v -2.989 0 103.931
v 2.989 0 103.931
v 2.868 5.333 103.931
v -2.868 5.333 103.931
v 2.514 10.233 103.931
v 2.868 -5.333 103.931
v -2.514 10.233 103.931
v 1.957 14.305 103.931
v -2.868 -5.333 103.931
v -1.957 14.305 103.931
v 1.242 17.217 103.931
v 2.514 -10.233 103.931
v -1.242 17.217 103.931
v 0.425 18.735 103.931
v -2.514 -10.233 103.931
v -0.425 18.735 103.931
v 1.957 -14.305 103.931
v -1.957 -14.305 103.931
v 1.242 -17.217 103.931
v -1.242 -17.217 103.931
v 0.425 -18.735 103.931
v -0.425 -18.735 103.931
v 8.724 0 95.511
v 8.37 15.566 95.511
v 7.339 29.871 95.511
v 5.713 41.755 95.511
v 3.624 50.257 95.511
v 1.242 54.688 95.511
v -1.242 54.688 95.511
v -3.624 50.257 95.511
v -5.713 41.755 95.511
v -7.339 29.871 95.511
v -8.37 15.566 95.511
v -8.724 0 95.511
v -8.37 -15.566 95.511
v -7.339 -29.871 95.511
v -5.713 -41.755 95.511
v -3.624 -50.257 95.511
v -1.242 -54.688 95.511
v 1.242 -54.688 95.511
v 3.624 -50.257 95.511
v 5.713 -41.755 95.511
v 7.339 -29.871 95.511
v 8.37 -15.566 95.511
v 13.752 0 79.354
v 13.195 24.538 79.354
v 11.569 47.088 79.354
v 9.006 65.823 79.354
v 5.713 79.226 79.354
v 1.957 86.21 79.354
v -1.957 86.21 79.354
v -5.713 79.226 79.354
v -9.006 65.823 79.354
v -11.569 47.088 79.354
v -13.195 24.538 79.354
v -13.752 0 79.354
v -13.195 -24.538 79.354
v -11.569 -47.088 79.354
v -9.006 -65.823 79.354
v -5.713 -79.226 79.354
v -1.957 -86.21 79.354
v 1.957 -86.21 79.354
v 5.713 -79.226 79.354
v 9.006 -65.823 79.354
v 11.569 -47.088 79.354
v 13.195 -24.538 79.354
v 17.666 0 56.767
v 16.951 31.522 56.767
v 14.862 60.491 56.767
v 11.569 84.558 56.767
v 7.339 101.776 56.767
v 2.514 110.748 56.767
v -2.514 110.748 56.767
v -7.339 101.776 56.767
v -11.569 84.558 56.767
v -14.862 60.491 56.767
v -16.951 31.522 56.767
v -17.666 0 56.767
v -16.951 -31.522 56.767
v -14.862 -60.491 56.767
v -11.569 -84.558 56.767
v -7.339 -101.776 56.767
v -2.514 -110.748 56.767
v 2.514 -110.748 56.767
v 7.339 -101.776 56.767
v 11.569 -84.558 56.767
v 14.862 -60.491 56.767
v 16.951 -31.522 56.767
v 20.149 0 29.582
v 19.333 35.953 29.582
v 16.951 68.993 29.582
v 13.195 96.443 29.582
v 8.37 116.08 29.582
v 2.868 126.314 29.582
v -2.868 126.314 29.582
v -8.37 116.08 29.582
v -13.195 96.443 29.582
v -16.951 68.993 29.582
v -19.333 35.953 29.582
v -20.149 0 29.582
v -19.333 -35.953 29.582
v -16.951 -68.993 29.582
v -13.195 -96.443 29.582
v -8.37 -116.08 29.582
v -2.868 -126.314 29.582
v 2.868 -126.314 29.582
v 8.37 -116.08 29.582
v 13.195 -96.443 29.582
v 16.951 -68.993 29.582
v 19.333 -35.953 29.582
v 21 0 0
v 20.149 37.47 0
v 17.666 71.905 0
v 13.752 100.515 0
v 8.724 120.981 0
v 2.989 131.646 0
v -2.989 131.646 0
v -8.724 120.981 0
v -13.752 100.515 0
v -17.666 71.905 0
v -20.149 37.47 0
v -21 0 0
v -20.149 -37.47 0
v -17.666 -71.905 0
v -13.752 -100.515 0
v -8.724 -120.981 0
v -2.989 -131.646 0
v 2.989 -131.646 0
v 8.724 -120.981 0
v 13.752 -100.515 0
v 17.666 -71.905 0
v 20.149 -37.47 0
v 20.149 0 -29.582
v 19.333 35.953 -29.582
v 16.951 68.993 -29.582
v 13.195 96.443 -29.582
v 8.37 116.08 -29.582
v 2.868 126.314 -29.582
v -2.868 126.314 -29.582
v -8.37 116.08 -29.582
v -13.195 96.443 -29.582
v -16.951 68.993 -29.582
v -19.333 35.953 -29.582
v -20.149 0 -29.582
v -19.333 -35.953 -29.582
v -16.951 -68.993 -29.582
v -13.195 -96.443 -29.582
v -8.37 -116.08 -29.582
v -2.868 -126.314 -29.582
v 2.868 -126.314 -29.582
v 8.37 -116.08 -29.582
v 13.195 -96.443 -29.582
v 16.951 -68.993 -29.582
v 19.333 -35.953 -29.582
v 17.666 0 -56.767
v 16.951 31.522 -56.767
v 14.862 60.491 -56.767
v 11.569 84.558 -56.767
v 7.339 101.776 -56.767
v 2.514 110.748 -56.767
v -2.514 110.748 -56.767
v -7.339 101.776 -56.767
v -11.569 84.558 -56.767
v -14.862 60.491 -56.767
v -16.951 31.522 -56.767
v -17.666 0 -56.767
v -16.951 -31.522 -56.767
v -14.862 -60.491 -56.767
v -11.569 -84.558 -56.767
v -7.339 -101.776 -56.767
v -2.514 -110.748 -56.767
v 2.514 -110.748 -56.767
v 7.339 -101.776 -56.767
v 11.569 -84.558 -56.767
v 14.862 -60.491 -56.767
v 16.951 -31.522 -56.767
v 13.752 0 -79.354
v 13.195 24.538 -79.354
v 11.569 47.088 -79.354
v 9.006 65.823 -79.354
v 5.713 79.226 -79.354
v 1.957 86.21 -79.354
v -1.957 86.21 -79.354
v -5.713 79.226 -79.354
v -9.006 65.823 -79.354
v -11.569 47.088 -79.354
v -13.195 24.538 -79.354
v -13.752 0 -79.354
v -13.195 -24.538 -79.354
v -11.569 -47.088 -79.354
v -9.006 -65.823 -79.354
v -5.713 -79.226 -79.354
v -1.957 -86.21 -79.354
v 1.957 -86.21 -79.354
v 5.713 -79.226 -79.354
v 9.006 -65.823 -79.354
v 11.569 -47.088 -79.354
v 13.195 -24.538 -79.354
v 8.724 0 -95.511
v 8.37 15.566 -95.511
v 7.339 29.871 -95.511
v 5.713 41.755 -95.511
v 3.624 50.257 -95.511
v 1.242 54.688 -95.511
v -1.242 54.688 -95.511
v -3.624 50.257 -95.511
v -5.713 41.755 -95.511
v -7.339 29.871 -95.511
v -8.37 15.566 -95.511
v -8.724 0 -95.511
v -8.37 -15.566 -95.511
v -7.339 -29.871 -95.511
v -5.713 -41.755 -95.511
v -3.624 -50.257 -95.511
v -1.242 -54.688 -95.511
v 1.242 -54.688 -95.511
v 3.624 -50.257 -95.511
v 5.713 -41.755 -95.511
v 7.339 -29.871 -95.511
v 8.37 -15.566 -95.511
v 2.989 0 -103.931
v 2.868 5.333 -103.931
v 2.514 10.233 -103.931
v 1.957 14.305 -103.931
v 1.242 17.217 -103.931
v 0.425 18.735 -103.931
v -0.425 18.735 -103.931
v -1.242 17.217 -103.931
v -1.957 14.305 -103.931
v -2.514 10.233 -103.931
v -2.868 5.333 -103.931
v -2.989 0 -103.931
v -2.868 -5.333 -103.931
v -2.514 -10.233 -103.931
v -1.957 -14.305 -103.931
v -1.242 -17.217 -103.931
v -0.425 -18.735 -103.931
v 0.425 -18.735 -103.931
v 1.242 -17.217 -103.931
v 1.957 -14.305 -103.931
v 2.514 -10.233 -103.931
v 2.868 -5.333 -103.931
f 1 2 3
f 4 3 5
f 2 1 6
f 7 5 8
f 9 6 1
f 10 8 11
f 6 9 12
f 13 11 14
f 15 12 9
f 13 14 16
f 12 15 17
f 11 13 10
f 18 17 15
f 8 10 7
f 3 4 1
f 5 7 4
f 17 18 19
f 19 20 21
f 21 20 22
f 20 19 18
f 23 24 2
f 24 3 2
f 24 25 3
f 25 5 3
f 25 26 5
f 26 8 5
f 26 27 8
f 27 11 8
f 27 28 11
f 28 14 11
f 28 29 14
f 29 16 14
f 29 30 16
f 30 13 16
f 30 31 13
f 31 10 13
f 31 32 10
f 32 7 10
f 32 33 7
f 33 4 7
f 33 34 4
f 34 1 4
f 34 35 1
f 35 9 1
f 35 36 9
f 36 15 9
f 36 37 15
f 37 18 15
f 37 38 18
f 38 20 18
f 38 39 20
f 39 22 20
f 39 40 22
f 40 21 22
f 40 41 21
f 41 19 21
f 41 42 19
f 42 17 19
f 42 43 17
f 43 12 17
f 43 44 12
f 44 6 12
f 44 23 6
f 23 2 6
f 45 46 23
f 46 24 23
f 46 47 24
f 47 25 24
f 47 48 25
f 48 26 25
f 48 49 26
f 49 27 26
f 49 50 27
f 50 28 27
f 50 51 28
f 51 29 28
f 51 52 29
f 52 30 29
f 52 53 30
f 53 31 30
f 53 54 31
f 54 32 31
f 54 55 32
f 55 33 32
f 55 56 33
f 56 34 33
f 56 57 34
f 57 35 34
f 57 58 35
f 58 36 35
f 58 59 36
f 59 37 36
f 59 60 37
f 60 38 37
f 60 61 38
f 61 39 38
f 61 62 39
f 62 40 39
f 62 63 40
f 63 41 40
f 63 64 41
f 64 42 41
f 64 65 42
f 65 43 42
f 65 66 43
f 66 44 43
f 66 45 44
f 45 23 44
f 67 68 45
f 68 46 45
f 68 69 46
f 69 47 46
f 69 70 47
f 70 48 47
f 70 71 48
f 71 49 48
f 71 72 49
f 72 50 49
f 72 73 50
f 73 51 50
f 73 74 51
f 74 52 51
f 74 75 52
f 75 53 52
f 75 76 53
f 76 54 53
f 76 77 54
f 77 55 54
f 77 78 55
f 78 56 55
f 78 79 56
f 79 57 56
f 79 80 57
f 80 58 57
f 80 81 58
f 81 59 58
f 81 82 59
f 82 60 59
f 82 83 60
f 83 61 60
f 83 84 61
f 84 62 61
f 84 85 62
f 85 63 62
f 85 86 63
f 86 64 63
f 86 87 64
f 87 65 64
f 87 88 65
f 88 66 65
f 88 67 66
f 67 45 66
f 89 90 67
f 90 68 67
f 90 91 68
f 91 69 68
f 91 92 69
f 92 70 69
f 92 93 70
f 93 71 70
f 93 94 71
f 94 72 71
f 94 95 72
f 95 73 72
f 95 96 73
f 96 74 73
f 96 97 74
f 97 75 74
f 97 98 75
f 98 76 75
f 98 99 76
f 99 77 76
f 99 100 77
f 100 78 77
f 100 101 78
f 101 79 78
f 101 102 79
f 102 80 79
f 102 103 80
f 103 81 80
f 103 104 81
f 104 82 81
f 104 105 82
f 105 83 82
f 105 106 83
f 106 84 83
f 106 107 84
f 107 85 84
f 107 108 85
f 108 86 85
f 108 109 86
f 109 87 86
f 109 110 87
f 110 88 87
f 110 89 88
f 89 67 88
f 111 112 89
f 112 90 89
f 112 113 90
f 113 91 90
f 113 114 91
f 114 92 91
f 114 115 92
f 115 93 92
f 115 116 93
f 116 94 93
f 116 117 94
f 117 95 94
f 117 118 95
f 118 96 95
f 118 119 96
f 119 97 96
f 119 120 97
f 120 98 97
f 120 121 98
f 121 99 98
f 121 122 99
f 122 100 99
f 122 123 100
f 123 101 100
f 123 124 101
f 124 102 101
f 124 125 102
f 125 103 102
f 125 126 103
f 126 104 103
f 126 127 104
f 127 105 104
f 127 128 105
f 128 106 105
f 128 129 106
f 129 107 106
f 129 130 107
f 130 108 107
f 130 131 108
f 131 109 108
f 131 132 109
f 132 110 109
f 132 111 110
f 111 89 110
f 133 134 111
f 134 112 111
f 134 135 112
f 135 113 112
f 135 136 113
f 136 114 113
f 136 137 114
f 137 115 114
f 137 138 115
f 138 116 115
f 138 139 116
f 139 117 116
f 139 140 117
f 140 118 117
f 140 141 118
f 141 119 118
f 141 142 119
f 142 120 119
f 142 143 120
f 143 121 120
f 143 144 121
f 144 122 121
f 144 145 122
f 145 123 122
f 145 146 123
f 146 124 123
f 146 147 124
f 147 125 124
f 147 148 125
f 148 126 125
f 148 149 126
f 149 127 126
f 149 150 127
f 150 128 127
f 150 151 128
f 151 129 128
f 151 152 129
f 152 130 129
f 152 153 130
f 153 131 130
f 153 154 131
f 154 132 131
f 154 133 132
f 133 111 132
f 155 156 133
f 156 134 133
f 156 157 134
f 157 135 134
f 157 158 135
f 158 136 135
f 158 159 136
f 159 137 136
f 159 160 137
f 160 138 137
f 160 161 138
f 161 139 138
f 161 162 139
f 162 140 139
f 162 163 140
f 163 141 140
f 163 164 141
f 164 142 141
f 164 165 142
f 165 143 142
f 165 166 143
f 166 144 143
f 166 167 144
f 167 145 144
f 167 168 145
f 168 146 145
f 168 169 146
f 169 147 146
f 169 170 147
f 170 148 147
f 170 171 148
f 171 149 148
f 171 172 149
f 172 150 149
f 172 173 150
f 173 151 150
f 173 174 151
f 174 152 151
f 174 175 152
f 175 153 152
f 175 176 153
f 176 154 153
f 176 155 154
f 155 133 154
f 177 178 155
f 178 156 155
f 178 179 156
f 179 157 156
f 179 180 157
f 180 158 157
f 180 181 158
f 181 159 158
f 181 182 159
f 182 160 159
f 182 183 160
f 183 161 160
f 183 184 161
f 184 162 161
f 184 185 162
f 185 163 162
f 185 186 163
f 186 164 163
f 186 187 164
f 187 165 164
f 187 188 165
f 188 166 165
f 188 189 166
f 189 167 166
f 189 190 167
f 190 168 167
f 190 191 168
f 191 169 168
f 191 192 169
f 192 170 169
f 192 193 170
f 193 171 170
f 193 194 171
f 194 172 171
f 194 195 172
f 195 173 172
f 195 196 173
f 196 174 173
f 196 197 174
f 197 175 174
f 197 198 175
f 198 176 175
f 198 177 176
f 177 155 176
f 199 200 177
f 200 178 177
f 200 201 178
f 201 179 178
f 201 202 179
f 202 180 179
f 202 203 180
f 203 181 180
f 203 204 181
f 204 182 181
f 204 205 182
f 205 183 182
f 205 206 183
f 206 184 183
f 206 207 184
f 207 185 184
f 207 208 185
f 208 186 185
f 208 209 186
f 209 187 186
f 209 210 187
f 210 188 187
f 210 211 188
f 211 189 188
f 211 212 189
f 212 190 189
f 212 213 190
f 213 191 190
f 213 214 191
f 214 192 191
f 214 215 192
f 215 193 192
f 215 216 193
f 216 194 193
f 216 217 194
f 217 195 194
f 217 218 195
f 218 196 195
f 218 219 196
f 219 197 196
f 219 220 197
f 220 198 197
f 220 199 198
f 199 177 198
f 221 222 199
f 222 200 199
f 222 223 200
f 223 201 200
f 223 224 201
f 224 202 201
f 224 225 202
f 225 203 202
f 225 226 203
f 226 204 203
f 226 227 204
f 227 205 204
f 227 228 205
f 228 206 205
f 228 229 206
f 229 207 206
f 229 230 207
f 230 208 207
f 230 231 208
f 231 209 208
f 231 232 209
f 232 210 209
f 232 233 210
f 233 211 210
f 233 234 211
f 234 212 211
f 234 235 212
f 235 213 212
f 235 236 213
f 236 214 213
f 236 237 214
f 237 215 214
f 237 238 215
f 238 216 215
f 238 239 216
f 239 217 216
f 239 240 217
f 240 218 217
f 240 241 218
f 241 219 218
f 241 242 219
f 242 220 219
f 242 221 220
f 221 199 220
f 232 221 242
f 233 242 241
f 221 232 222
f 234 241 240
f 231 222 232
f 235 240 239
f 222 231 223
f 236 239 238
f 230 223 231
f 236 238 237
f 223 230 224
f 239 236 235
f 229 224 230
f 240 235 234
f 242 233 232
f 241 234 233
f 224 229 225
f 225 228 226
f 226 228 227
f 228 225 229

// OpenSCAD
// Generated by SolidPython 1.0.1 on 2020-07-29 00:46:46


scale(v = [3, 19, 15]) {
	sphere(r = 7);
}
/***********************************************
*********      SolidPython code:      **********
************************************************
 
# import packages: SolidPython
from solid import *
from solid.utils import *
from itertools import chain, combinations, permutations


class Resize:

    def __init__(self, scad_file):
        self.scad_file = scad_file
        #self.scad_file = import_scad(scad_file)
        # cone/cylinder param:
        self.r1 = 0
        self.r2 = 0
        self.h = 0
        # rectangular prism param:
        self.w = 0
        self.l = 0
        # ellipse param:
        self.r = 0

    # import OpenScad code (file name corresponds to shape)


    # classify shape + parameters
    def assign(self, param1, param2, param3):
        if self.scad_file == 'cone.scad':
            self.r1 = param1
            self.r2 = param2
            self.h = param3
        elif self.scad_file == 'cylinder.scad':
            self.r1 = param1
            self.r2 = param2
            self.h = param3
        elif self.scad_file == 'rectangularPrism.scad':
            self.h = param1
            self.l = param2
            self.w = param3
        else:
            self.r = param1
            self.h = param2

    # resize parameters
    def iterate(self):
        x = range(3, 20, 2)
        i = 1
        if self.scad_file == 'cone.scad':
            tempList = list(permutations(x, 2))
            for temp in tempList:
                param1 = temp[0]
                param2 = temp[1]
                filepath = 'produced_scad_files/' + 'cone' + str(param1) + '_' + str(param2) + '_' + '.scad'
                scad_render_to_file(cylinder(h=param1, r1=param2, r2=0), filepath)

        elif self.scad_file == 'cylinder.scad':
            tempList = list(permutations(x, 3))
            for temp in tempList:
                param1 = temp[0]
                param2 = temp[1]
                filepath = 'produced_scad_files/' + 'cylinder' + str(param1) + '_' + str(param2) + '_' + '.scad'
                scad_render_to_file(cylinder(h=param1, r1=param2, r2=param2), filepath)

        elif self.scad_file == 'rectangularPrism.scad':
            tempList = list(permutations(x, 3))
            for temp in tempList:
                param1 = temp[0]
                param2 = temp[1]
                param3 = temp[2]
                filepath = 'produced_scad_files/' + 'rectangularPrism' + str(param1) + '_' + str(param2) + '_' + str(
                    param3) + '.scad'
                scad_render_to_file(cube(size=(param1, param2, param3)), filepath)

        elif self.scad_file == 'ellipse.scad':
            tempList = list(permutations(x, 4))
            for temp in tempList:
                param1 = temp[0]
                param2 = temp[1]
                param3 = temp[2]
                param4 = temp[3]
                filepath = 'produced_scad_files/' + 'ellipse' + str(param1) + '_' + str(param2) + '_' + str(param3) + '_' + str(param4) + '.scad'
                scad_render_to_file(scale([param1, param2, param3])(sphere(r=param4)), filepath)

    def render_to_scadfile(self):
        scad_render_to_file(scad, 'example.scad') 
 
************************************************/
